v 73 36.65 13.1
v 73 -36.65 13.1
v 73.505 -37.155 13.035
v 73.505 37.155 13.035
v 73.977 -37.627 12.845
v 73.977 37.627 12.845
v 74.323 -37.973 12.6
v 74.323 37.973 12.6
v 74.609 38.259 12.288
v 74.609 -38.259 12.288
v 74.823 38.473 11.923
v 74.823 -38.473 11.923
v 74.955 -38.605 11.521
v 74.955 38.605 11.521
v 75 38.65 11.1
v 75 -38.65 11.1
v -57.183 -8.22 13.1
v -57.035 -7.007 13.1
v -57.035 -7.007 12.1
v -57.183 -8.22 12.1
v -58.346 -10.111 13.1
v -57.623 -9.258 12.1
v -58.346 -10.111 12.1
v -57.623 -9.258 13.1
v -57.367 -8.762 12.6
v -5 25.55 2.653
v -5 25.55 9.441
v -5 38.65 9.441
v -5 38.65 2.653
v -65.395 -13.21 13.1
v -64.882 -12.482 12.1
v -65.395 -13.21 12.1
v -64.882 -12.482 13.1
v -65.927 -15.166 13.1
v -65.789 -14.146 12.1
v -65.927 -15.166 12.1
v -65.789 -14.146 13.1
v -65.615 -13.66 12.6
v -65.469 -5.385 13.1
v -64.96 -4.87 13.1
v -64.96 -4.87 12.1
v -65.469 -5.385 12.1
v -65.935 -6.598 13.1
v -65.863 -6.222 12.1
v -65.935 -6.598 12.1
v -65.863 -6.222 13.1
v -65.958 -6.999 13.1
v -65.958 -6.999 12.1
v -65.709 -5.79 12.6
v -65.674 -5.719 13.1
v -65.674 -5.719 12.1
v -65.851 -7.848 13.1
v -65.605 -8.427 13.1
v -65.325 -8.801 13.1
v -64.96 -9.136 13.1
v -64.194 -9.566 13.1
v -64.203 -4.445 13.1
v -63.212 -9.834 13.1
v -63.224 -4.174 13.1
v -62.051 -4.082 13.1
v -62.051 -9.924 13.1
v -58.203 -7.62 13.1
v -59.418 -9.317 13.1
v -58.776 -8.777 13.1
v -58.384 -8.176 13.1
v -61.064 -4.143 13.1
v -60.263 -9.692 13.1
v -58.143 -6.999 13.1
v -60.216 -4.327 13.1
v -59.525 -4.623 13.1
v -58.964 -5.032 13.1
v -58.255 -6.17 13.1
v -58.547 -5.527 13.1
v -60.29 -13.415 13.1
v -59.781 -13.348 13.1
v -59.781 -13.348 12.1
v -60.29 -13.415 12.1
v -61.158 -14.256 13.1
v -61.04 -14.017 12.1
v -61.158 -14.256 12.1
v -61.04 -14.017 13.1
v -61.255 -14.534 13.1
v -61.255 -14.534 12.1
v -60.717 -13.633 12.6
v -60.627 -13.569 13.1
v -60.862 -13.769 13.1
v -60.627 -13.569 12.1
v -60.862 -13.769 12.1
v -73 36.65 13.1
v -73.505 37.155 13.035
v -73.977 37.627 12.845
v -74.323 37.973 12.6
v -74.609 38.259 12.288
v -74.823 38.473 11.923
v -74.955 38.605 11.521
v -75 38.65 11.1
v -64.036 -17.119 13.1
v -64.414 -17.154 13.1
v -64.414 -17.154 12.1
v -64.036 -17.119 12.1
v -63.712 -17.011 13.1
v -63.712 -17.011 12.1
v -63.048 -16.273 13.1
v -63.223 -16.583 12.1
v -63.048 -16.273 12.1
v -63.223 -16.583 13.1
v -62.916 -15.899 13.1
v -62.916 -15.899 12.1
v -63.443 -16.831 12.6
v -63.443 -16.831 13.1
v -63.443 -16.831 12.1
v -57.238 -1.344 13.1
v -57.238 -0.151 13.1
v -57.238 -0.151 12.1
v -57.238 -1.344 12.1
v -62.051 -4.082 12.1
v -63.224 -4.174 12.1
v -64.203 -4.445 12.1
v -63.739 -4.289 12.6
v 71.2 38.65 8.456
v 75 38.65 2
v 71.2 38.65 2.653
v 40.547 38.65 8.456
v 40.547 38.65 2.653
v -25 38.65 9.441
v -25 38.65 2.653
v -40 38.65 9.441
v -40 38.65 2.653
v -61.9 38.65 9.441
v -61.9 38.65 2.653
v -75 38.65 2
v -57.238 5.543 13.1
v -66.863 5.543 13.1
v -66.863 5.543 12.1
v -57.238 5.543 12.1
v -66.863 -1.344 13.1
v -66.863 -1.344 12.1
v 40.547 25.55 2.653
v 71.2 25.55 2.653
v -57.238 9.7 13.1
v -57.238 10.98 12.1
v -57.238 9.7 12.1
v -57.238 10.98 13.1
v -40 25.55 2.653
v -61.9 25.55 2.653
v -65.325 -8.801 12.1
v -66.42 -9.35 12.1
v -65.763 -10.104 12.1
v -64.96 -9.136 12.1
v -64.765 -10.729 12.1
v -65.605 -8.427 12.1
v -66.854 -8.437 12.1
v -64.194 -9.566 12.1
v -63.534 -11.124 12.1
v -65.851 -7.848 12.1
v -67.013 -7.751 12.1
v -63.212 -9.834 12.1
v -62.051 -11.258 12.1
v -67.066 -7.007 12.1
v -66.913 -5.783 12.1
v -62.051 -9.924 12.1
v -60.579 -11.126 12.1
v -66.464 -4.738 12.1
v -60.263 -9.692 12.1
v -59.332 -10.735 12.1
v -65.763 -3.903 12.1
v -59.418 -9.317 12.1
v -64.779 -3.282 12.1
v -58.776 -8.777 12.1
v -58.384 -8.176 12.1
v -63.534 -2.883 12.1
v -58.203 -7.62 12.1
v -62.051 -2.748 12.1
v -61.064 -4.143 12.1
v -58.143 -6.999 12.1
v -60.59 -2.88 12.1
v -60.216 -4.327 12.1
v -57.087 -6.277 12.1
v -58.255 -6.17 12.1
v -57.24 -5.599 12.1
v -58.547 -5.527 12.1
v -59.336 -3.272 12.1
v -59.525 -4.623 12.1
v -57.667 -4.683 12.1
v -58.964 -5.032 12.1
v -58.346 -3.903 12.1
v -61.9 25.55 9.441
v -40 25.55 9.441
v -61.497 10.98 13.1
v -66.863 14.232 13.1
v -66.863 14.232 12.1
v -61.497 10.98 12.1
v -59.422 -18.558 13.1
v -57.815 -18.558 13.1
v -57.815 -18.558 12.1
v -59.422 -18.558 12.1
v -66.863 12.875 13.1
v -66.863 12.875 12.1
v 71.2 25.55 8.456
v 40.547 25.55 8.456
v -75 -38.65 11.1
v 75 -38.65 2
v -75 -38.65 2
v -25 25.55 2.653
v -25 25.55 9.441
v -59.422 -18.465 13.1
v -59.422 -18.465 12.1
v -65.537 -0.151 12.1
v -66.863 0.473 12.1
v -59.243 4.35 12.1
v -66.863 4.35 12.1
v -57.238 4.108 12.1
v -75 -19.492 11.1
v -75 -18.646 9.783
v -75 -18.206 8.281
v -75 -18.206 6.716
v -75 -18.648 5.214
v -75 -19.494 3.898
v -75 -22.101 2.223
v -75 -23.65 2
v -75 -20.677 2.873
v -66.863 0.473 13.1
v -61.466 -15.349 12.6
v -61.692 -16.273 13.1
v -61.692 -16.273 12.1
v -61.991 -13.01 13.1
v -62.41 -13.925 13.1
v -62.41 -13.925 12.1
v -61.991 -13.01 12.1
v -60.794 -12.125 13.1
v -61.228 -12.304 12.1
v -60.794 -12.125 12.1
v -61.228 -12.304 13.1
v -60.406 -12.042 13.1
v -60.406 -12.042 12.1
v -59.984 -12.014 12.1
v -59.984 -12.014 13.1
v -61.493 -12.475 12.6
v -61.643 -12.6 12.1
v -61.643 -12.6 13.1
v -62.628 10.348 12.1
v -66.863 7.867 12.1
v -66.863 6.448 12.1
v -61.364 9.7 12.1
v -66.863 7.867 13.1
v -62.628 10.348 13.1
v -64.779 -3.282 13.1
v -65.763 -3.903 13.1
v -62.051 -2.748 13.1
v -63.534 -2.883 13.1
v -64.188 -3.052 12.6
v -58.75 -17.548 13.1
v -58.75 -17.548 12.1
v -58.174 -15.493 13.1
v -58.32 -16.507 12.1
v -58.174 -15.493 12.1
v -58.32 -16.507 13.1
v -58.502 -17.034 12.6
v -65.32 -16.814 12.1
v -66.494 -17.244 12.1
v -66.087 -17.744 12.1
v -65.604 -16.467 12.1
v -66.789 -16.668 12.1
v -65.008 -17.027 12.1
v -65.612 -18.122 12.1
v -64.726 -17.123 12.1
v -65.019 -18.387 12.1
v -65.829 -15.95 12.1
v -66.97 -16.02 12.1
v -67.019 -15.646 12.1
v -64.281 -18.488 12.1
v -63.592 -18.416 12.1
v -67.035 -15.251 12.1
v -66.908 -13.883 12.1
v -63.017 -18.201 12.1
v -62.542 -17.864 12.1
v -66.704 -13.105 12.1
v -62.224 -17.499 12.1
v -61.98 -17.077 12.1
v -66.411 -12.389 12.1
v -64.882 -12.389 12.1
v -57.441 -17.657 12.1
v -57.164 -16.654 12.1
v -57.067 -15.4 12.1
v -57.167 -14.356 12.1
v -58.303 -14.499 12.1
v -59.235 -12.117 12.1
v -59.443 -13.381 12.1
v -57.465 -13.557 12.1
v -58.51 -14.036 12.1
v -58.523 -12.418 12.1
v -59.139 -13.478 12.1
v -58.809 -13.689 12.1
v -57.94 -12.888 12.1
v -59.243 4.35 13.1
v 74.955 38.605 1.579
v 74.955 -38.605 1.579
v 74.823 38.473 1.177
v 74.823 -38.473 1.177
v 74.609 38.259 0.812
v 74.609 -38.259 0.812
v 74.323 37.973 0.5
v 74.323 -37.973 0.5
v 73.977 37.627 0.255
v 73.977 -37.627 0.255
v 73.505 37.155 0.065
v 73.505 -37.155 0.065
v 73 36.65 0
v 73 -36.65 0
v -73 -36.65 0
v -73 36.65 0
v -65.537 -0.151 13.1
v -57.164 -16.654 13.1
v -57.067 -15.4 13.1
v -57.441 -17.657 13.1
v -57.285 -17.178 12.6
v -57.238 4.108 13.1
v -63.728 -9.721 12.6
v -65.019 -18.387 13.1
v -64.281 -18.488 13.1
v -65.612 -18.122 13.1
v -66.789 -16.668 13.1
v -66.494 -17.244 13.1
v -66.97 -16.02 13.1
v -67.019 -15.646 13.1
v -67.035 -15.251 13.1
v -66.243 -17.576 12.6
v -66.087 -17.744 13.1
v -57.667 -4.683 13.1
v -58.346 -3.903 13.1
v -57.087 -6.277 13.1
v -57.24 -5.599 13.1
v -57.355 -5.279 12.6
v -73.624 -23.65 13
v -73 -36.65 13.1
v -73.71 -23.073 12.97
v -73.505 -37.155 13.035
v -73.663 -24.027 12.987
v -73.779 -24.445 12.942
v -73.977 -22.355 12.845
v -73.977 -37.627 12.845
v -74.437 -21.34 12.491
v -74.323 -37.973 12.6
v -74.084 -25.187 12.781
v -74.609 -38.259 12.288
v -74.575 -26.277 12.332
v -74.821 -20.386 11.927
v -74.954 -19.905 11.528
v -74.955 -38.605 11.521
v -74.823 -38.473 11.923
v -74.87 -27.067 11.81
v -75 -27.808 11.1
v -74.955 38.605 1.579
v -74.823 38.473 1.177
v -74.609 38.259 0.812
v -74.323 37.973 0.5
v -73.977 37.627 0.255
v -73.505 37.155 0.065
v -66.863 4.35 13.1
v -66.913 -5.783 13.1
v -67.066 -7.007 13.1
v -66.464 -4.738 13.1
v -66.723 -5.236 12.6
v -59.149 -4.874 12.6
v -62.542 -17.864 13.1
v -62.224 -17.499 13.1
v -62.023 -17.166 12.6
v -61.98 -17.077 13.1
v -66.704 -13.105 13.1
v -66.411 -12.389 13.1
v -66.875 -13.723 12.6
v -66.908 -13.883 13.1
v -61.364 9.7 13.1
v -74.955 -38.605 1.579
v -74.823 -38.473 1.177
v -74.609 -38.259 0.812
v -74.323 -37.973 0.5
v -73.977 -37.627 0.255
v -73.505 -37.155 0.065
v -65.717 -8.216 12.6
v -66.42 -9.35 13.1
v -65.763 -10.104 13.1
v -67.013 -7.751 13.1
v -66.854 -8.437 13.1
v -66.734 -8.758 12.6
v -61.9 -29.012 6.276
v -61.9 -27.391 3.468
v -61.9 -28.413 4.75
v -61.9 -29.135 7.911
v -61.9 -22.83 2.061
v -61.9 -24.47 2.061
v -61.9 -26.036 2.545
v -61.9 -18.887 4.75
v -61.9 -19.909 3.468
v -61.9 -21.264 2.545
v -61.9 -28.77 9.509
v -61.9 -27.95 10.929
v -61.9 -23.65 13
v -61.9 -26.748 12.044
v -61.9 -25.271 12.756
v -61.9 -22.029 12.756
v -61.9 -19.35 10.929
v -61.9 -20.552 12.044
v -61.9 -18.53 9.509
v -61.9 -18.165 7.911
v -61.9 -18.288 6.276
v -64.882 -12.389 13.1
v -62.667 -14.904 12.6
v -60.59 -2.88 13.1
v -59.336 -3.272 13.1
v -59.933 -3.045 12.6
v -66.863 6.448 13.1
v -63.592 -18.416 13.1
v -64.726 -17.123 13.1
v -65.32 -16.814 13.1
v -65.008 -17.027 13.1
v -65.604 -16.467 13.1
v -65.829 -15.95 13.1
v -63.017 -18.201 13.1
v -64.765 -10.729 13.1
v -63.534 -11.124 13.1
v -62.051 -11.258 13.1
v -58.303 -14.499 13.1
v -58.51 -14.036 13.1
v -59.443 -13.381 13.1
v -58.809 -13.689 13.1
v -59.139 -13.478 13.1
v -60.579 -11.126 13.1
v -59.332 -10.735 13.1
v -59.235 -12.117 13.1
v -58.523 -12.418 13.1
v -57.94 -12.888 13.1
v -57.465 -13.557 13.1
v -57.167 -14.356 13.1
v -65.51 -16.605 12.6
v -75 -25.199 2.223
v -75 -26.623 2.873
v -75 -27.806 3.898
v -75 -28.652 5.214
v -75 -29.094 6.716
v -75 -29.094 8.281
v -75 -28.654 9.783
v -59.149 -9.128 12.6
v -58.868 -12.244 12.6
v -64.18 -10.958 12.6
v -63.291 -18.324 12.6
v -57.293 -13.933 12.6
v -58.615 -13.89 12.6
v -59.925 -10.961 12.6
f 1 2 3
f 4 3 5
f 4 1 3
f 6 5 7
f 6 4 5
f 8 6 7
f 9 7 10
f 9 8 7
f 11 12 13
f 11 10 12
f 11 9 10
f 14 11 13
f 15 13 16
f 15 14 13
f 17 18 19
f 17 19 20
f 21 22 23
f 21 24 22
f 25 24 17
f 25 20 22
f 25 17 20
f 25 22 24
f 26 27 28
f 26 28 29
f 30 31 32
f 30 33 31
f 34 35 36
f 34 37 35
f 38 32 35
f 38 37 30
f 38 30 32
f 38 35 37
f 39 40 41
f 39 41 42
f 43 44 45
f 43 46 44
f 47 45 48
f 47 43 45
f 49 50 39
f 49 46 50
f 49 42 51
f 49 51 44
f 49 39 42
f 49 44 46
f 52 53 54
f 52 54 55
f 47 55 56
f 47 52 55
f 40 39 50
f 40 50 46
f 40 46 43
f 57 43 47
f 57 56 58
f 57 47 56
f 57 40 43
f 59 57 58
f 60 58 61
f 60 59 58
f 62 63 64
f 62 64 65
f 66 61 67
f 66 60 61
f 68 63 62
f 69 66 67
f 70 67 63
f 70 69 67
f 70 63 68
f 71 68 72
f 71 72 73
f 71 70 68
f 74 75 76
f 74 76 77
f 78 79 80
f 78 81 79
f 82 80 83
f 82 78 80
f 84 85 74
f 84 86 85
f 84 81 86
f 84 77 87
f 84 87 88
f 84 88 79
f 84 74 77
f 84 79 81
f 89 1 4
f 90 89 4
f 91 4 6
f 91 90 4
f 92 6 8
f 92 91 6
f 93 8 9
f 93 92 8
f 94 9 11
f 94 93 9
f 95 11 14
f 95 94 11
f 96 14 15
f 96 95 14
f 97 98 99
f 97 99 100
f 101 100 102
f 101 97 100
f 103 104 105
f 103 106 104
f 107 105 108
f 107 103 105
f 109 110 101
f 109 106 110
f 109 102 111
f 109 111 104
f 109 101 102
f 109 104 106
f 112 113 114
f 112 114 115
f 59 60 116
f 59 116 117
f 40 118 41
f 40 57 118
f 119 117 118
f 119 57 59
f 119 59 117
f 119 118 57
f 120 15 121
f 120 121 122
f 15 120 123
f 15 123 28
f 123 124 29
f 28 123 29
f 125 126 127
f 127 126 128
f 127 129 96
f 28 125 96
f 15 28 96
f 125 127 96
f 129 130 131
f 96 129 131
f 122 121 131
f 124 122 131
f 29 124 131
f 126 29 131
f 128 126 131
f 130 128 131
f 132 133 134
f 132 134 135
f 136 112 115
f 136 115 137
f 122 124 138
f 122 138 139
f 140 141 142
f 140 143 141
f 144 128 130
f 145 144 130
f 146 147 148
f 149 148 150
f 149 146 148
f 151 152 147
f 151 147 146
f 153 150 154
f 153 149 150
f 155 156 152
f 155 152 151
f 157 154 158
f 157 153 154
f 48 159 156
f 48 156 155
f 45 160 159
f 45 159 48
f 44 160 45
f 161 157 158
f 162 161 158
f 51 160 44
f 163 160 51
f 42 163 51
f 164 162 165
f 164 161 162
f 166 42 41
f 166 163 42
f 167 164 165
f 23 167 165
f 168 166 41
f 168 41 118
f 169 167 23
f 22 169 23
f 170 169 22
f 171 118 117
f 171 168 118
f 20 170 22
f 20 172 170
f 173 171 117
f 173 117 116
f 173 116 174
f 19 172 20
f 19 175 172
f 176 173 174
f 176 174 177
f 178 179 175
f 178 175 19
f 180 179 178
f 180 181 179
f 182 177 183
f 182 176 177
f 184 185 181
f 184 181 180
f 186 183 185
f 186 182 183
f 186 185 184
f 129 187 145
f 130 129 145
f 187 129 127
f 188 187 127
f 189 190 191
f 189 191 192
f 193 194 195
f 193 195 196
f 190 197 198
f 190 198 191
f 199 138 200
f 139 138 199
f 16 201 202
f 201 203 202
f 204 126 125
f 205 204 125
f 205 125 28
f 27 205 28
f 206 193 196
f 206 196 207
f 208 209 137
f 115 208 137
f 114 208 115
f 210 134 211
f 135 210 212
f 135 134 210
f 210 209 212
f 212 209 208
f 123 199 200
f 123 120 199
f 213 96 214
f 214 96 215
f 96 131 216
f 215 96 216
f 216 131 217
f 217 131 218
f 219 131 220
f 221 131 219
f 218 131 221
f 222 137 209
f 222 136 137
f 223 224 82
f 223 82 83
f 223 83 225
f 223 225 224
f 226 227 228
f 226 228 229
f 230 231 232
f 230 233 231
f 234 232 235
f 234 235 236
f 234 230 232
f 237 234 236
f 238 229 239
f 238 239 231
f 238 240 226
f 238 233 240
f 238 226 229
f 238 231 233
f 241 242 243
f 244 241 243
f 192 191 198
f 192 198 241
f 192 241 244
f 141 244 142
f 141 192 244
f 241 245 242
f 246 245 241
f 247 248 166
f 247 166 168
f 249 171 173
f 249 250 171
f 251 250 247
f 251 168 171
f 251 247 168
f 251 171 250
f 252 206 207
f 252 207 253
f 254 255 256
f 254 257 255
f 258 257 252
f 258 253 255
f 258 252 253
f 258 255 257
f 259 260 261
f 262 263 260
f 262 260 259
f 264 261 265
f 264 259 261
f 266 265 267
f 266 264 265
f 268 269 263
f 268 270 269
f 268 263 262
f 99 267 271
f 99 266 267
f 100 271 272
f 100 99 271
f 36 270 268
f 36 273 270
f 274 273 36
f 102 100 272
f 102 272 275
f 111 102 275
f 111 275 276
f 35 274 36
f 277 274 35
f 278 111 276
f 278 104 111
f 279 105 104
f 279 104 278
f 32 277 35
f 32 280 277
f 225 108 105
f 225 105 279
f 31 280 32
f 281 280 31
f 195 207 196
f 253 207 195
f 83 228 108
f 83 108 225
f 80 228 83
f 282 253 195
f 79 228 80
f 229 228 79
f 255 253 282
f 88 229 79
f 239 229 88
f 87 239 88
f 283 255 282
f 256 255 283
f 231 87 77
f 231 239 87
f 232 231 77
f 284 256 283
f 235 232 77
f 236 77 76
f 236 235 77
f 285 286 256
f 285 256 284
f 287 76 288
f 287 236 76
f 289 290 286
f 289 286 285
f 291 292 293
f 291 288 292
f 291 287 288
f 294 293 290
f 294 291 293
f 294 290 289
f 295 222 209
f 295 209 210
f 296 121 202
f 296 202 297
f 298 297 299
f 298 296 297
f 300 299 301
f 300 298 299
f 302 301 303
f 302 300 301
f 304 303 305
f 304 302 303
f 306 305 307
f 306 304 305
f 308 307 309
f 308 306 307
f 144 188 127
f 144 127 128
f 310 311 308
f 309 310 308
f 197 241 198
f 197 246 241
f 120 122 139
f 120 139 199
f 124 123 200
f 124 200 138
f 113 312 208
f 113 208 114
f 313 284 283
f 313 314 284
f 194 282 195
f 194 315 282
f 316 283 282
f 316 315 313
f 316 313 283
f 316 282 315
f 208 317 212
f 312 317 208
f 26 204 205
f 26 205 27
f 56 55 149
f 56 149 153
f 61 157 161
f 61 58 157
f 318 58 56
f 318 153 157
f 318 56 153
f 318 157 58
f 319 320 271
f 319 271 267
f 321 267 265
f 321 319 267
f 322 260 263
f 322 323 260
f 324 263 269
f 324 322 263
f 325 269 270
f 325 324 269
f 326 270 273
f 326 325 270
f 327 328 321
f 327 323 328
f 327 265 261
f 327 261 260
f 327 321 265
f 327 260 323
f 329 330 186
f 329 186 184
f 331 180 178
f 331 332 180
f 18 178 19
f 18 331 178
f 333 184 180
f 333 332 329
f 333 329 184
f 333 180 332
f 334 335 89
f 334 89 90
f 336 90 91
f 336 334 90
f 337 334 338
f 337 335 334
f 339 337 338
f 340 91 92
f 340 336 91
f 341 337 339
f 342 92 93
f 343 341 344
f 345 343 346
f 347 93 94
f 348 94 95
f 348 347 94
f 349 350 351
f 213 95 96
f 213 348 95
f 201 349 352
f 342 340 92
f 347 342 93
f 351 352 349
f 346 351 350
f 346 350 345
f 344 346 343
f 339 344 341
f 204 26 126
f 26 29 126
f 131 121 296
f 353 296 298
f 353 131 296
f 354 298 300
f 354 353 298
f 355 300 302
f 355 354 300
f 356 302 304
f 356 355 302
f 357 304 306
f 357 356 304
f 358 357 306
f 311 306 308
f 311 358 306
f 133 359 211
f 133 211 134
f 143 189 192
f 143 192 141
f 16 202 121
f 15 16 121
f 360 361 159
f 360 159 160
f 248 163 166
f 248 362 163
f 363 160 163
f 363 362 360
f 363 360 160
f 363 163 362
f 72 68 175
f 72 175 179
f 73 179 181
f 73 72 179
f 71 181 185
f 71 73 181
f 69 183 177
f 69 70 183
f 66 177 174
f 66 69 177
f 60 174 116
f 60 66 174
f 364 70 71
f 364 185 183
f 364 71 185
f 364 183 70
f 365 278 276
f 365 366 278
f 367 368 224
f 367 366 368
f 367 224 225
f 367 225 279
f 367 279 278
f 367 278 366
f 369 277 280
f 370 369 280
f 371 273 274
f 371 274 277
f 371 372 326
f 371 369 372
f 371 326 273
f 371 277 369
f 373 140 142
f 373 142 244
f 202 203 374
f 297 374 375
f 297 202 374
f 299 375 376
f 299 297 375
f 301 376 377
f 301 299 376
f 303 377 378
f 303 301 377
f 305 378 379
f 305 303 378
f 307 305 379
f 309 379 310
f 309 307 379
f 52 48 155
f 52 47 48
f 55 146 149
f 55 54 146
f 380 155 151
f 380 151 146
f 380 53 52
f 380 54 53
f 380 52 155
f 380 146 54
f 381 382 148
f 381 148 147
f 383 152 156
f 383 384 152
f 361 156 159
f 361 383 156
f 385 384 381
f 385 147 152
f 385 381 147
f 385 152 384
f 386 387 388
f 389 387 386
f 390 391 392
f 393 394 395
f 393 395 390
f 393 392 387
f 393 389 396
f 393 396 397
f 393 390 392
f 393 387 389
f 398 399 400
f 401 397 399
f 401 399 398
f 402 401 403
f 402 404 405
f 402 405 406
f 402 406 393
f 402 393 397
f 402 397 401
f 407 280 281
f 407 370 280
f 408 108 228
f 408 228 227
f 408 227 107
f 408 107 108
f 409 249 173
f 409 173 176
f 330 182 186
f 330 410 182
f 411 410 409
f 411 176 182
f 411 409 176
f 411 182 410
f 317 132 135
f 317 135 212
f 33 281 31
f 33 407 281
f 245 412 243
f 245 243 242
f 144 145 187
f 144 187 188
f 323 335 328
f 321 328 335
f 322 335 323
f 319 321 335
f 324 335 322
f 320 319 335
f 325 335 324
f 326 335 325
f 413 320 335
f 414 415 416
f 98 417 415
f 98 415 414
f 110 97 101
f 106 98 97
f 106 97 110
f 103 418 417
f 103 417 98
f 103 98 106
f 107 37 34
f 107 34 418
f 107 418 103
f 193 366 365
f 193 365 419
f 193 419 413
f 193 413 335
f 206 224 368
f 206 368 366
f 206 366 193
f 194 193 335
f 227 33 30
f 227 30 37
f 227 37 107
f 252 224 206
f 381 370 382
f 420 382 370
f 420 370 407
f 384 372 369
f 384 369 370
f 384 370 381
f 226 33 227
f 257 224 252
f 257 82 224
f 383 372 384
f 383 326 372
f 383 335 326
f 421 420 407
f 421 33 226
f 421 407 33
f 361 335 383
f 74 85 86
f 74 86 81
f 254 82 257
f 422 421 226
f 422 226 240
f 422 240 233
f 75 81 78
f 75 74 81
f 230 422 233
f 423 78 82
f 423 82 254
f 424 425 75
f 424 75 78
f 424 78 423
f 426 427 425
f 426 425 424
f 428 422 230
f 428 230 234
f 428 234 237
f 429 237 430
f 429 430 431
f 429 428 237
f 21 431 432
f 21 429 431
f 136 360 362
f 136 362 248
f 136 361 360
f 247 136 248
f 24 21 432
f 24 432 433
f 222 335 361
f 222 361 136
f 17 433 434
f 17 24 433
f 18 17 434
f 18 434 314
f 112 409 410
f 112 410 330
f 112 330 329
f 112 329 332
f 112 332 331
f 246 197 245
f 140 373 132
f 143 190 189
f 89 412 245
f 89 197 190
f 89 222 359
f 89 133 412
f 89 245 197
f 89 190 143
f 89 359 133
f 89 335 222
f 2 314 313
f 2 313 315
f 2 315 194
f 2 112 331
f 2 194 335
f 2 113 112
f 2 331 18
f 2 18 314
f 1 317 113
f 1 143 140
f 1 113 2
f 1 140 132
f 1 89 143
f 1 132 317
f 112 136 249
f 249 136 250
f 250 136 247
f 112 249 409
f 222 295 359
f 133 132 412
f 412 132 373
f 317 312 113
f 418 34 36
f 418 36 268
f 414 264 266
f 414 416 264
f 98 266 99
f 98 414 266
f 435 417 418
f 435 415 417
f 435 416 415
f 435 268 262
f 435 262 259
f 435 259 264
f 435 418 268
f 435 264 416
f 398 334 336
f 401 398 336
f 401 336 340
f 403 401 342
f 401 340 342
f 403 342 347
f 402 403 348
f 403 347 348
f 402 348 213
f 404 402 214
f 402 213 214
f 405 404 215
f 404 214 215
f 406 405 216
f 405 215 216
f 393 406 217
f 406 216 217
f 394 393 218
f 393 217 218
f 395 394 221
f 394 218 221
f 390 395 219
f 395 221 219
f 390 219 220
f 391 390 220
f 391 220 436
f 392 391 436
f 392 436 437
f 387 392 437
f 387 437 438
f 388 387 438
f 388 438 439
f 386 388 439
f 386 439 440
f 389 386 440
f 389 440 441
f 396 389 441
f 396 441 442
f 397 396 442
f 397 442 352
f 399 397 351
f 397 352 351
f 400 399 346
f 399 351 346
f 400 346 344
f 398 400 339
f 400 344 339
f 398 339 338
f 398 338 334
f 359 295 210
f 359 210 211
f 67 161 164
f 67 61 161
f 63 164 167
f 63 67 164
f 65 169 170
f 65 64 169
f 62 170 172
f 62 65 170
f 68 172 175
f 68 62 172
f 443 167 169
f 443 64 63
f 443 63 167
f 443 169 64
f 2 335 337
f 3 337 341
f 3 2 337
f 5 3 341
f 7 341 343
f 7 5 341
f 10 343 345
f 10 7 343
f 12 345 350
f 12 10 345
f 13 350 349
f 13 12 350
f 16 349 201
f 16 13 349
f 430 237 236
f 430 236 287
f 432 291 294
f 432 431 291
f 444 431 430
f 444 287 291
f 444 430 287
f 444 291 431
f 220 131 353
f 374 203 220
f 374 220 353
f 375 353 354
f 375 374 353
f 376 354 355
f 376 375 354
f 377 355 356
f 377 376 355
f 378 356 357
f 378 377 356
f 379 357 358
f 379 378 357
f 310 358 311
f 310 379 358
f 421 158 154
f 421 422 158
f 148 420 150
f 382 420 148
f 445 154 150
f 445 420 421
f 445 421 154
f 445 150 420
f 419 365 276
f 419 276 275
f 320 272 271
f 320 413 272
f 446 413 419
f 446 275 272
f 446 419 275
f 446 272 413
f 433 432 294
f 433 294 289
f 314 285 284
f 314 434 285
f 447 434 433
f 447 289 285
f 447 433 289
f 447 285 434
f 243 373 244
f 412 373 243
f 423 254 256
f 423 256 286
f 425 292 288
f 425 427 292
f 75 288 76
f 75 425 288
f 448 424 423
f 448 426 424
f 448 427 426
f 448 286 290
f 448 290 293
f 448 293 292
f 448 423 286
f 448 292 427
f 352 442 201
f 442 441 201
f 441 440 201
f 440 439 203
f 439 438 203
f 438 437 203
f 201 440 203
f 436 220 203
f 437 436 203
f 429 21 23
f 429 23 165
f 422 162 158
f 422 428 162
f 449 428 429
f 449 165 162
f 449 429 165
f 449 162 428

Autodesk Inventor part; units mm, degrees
ref_plane "YZ Plane" through (0, 0, 0) normal (1, 0, 0) x (0, 1, 0)
ref_plane "XZ Plane" through (0, 0, 0) normal (0, 1, 0) x (-1, 0, 0)
ref_plane "XY Plane" through (0, 0, 0) normal (0, 0, 1) x (1, 0, 0)
sketch "Skizze1" plane through (0, 0, 0) normal (0, 0, 1) x (1, 0, 0)
  line L0 (75, 38.65) -> (-75, 38.65)
  line L1 (-75, 38.65) -> (-75, -38.65)
  line L2 (-75, -38.65) -> (75, -38.65)
  line L3 (75, -38.65) -> (75, 38.65)
  line L4 (75, 38.65) -> (-75, -38.65) construction
  line L5 (-75, 38.65) -> (75, -38.65) construction
  point P0 (0, 0)
  dimension "d0" = 150
  dimension "d1" = 77.3
extrude "Extrusion1" add sketch "Skizze1" along normal blind 13.1
fillet "Rundung1" radius 2 8 edges at (0, 38.65, 13.1) (0, 38.65, 0) (0, -38.65, 13.1) (0, -38.65, 0) (75, 0, 13.1) (75, 0, 0) (-75, 0, 13.1) (-75, 0, 0)
sketch "Skizze2" plane through (-75, -38.65, 2) normal (-1, 0, 0) x (0, 0, 1)
  line L0 (0, 0) -> (0, 77.3) projected
  line L1 (0, 0) -> (9.1, 0) projected
  line L2 (9.1, 77.3) -> (9.1, 0) projected
  line L3 (0, 77.3) -> (9.1, 77.3) projected
  circle A0 centre (5.5, 15) radius 5.5
  line L4 (-2, 75.3) -> (-2, 2) projected
  point P0 (-2, 38.65)
  dimension "d5" = 7.5
  dimension "d6" = 15
extrude "Extrusion2" cut sketch "Skizze2" against normal blind 13.1 contours A0 L2 | A0 L2
sketch "Skizze3" plane through (-75, 38.65, 2) normal (0, 1, 0) x (1, 0, 0)
  line L0 (13.1, -11) -> (13.1, 0) projected
  line L1 (13.1, -7.4407) -> (35, -7.4407)
  line L2 (35, -7.4407) -> (35, -0.6533)
  line L3 (35, -0.6533) -> (13.1, -0.6533)
  line L4 (13.1, -0.6533) -> (13.1, -7.4407)
  line L5 (50, -7.4407) -> (70, -7.4407)
  line L6 (70, -7.4407) -> (70, -0.6533)
  line L7 (70, -0.6533) -> (50, -0.6533)
  line L8 (50, -0.6533) -> (50, -7.4407)
  line L9 (146.1998, -6.4555) -> (115.5466, -6.4555)
  line L10 (115.5466, -6.4555) -> (115.5466, -0.6533)
  line L11 (115.5466, -0.6533) -> (146.1998, -0.6533)
  line L12 (146.1998, -0.6533) -> (146.1998, -6.4555)
  line L13 (0, 0) -> (0, -9.1) projected
  point P0 (75, 2)
  dimension "d11" = 35
  dimension "d12" = 50
  dimension "d13" = 70
extrude "Extrusion3" cut sketch "Skizze3" against normal blind 13.1
sketch "Skizze4" plane through (0, 0, 13.1) normal (0, 0, 1) x (1, 0, 0)
  line L0 (-67.066, -19.0577) -> (-67.066, 14.3022) construction
  line L1 (-67.066, 14.3022) -> (-57.0354, 14.3022) construction
  line L2 (-57.0354, 14.3022) -> (-57.0354, -19.0577) construction
  line L3 (-57.0354, -19.0577) -> (-67.066, -19.0577) construction
  spline S0 degree 2 poles (-57.0666, -15.3995) (-57.0666, -16.4447) (-57.5034, -17.9111) (-57.8154, -18.5585) knots 0 0 0 1 2 2 2
  line L4 (-57.8154, -18.5585) -> (-59.4221, -18.5585)
  line L5 (-59.4221, -18.5585) -> (-59.4221, -18.4649)
  spline S1 degree 2 poles (-59.4221, -18.4649) (-58.8294, -17.8331) (-58.1742, -16.2341) (-58.1742, -15.4931) knots 0 0 0 1 2 2 2
  spline S2 degree 2 poles (-58.1742, -15.4931) (-58.1742, -14.4324) (-59.0555, -13.3482) (-59.7809, -13.3482) knots 0 0 0 1 2 2 2
  spline S3 degree 2 poles (-59.7809, -13.3482) (-60.3581, -13.3482) (-61.0757, -13.9176) (-61.2551, -14.5338) knots 0 0 0 1 2 2 2
  spline S4 degree 2 poles (-61.2551, -14.5338) (-61.3799, -14.9784) (-61.5515, -15.7193) (-61.6919, -16.2731) knots 0 0 0 1 2 2 2
  spline S5 degree 2 poles (-61.6919, -16.2731) (-61.8245, -16.7723) (-62.2223, -17.5601) (-62.5421, -17.8643) knots 0 0 0 1 2 2 2
  spline S6 degree 2 poles (-62.5421, -17.8643) (-62.8619, -18.1607) (-63.7199, -18.4883) (-64.2814, -18.4883) knots 0 0 0 1 2 2 2
  spline S7 degree 2 poles (-64.2814, -18.4883) (-65.4514, -18.4883) (-67.0348, -16.6631) (-67.0348, -15.2514) knots 0 0 0 1 2 2 2
  spline S8 degree 2 poles (-67.0348, -15.2514) (-67.0348, -14.4402) (-66.715, -13.005) (-66.4108, -12.3888) knots 0 0 0 1 2 2 2
  line L6 (-66.4108, -12.3888) -> (-64.882, -12.3888)
  line L7 (-64.882, -12.3888) -> (-64.882, -12.4824)
  spline S9 degree 2 poles (-64.882, -12.4824) (-65.3032, -12.9426) (-65.9272, -14.3778) (-65.9272, -15.1656) knots 0 0 0 1 2 2 2
  spline S10 degree 2 poles (-65.9272, -15.1656) (-65.9272, -16.0547) (-65.0926, -17.1545) (-64.414, -17.1545) knots 0 0 0 1 2 2 2
  spline S11 degree 2 poles (-64.414, -17.1545) (-63.8057, -17.1545) (-63.0803, -16.5071) (-62.9165, -15.8987) knots 0 0 0 1 2 2 2
  spline S12 degree 2 poles (-62.9165, -15.8987) (-62.8073, -15.4931) (-62.5265, -14.3154) (-62.4095, -13.9254) knots 0 0 0 1 2 2 2
  spline S13 degree 2 poles (-62.4095, -13.9254) (-62.1053, -12.9348) (-60.8807, -12.0144) (-59.9837, -12.0144) knots 0 0 0 1 2 2 2
  spline S14 degree 2 poles (-59.9837, -12.0144) (-59.4143, -12.0144) (-58.3224, -12.4746) (-57.9402, -12.888) knots 0 0 0 1 2 2 2
  spline S15 degree 2 poles (-57.9402, -12.888) (-57.519, -13.3482) (-57.0666, -14.5182) (-57.0666, -15.3995) knots 0 0 0 1 2 2 2
  spline S16 degree 2 poles (-65.7634, -3.9026) (-65.1238, -3.3566) (-63.2519, -2.7482) (-62.0507, -2.7482) knots 0 0 0 1 2 2 2
  spline S17 degree 2 poles (-62.0507, -2.7482) (-60.8807, -2.7482) (-58.9854, -3.341) (-58.3458, -3.9026) knots 0 0 0 1 2 2 2
  spline S18 degree 2 poles (-58.3458, -3.9026) (-57.675, -4.4954) (-57.0354, -6.0631) (-57.0354, -7.0069) knots 0 0 0 1 2 2 2
  spline S19 degree 2 poles (-57.0354, -7.0069) (-57.0354, -7.9819) (-57.6984, -9.5419) (-58.3458, -10.1113) knots 0 0 0 1 2 2 2
  spline S20 degree 2 poles (-58.3458, -10.1113) (-58.9854, -10.665) (-60.8651, -11.2578) (-62.0507, -11.2578) knots 0 0 0 1 2 2 2
  spline S21 degree 2 poles (-62.0507, -11.2578) (-63.2597, -11.2578) (-65.1004, -10.6572) (-65.7634, -10.1035) knots 0 0 0 1 2 2 2
  spline S22 degree 2 poles (-65.7634, -10.1035) (-66.403, -9.5419) (-67.066, -7.9741) (-67.066, -7.0069) knots 0 0 0 1 2 2 2
  spline S23 degree 2 poles (-67.066, -7.0069) (-67.066, -6.0241) (-66.3796, -4.4486) (-65.7634, -3.9026) knots 0 0 0 1 2 2 2
  spline S24 degree 2 poles (-62.0507, -4.082) (-63.0023, -4.082) (-64.4764, -4.4954) (-64.96, -4.8698) knots 0 0 0 1 2 2 2
  spline S25 degree 2 poles (-64.96, -4.8698) (-65.4592, -5.252) (-65.9584, -6.3283) (-65.9584, -6.9991) knots 0 0 0 1 2 2 2
  spline S26 degree 2 poles (-65.9584, -6.9991) (-65.9584, -7.6933) (-65.4748, -8.7385) (-64.96, -9.1363) knots 0 0 0 1 2 2 2
  spline S27 degree 2 poles (-64.96, -9.1363) (-64.4686, -9.5185) (-62.9867, -9.9241) (-62.0507, -9.9241) knots 0 0 0 1 2 2 2
  spline S28 degree 2 poles (-62.0507, -9.9241) (-60.1553, -9.9241) (-58.143, -8.3329) (-58.143, -6.9991) knots 0 0 0 1 2 2 2
  spline S29 degree 2 poles (-58.143, -6.9991) (-58.143, -5.6653) (-60.1553, -4.082) (-62.0507, -4.082) knots 0 0 0 1 2 2 2
  line L8 (-57.2382, 5.543) -> (-57.2382, 4.1078)
  line L9 (-57.2382, 4.1078) -> (-65.5372, -0.1509)
  line L10 (-65.5372, -0.1509) -> (-57.2382, -0.1509)
  line L11 (-57.2382, -0.1509) -> (-57.2382, -1.3442)
  line L12 (-57.2382, -1.3442) -> (-66.8632, -1.3442)
  line L13 (-66.8632, -1.3442) -> (-66.8632, 0.4731)
  line L14 (-66.8632, 0.4731) -> (-59.2427, 4.3496)
  line L15 (-59.2427, 4.3496) -> (-66.8632, 4.3496)
  line L16 (-66.8632, 4.3496) -> (-66.8632, 5.543)
  line L17 (-66.8632, 5.543) -> (-57.2382, 5.543)
  line L18 (-66.8632, 14.232) -> (-61.4969, 10.9795)
  line L19 (-61.4969, 10.9795) -> (-57.2382, 10.9795)
  line L20 (-57.2382, 10.9795) -> (-57.2382, 9.7003)
  line L21 (-57.2382, 9.7003) -> (-61.3643, 9.7003)
  line L22 (-61.3643, 9.7003) -> (-66.8632, 6.4478)
  line L23 (-66.8632, 6.4478) -> (-66.8632, 7.8674)
  line L24 (-66.8632, 7.8674) -> (-62.6279, 10.3477)
  line L25 (-62.6279, 10.3477) -> (-66.8632, 12.8749)
  line L26 (-66.8632, 12.8749) -> (-66.8632, 14.232)
  point P0 (0, 0)
extrude "Extrusion4" cut sketch "Skizze4" against normal blind 1
properties part number "00_Sony_MDL_Projector"
